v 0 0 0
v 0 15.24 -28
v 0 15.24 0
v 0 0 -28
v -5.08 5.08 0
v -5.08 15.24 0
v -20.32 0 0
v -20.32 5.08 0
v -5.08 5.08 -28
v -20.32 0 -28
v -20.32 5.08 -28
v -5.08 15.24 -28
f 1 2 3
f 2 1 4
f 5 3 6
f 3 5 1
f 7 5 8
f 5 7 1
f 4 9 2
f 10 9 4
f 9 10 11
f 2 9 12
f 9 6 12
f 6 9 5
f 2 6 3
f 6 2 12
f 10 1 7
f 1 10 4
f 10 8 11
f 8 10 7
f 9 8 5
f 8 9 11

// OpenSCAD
module bedleg(cw_w = 5.08, cw_h = 15.24, mirror = true, leglength=28) 
{
    if (mirror) 
    {
        translate([-cw_w,0,-leglength]) color([0.40,0.30,0.16,1.0])
            cube([cw_w, cw_h, leglength],center=false);
        
        translate([-cw_w-cw_h,0,-leglength]) color([0.51,0.38,0.24,1.0])
            cube([cw_h, cw_w, leglength],center=false);
    }
    else {
        translate([0,0,-leglength]) color([0.40,0.30,0.16,1.0])
            cube([cw_w, cw_h, leglength],center=false);
        
        translate([cw_w,0,-leglength]) color([0.51,0.38,0.24,1.0])
            cube([cw_h, cw_w, leglength],center=false);
    }
}

bedleg();
